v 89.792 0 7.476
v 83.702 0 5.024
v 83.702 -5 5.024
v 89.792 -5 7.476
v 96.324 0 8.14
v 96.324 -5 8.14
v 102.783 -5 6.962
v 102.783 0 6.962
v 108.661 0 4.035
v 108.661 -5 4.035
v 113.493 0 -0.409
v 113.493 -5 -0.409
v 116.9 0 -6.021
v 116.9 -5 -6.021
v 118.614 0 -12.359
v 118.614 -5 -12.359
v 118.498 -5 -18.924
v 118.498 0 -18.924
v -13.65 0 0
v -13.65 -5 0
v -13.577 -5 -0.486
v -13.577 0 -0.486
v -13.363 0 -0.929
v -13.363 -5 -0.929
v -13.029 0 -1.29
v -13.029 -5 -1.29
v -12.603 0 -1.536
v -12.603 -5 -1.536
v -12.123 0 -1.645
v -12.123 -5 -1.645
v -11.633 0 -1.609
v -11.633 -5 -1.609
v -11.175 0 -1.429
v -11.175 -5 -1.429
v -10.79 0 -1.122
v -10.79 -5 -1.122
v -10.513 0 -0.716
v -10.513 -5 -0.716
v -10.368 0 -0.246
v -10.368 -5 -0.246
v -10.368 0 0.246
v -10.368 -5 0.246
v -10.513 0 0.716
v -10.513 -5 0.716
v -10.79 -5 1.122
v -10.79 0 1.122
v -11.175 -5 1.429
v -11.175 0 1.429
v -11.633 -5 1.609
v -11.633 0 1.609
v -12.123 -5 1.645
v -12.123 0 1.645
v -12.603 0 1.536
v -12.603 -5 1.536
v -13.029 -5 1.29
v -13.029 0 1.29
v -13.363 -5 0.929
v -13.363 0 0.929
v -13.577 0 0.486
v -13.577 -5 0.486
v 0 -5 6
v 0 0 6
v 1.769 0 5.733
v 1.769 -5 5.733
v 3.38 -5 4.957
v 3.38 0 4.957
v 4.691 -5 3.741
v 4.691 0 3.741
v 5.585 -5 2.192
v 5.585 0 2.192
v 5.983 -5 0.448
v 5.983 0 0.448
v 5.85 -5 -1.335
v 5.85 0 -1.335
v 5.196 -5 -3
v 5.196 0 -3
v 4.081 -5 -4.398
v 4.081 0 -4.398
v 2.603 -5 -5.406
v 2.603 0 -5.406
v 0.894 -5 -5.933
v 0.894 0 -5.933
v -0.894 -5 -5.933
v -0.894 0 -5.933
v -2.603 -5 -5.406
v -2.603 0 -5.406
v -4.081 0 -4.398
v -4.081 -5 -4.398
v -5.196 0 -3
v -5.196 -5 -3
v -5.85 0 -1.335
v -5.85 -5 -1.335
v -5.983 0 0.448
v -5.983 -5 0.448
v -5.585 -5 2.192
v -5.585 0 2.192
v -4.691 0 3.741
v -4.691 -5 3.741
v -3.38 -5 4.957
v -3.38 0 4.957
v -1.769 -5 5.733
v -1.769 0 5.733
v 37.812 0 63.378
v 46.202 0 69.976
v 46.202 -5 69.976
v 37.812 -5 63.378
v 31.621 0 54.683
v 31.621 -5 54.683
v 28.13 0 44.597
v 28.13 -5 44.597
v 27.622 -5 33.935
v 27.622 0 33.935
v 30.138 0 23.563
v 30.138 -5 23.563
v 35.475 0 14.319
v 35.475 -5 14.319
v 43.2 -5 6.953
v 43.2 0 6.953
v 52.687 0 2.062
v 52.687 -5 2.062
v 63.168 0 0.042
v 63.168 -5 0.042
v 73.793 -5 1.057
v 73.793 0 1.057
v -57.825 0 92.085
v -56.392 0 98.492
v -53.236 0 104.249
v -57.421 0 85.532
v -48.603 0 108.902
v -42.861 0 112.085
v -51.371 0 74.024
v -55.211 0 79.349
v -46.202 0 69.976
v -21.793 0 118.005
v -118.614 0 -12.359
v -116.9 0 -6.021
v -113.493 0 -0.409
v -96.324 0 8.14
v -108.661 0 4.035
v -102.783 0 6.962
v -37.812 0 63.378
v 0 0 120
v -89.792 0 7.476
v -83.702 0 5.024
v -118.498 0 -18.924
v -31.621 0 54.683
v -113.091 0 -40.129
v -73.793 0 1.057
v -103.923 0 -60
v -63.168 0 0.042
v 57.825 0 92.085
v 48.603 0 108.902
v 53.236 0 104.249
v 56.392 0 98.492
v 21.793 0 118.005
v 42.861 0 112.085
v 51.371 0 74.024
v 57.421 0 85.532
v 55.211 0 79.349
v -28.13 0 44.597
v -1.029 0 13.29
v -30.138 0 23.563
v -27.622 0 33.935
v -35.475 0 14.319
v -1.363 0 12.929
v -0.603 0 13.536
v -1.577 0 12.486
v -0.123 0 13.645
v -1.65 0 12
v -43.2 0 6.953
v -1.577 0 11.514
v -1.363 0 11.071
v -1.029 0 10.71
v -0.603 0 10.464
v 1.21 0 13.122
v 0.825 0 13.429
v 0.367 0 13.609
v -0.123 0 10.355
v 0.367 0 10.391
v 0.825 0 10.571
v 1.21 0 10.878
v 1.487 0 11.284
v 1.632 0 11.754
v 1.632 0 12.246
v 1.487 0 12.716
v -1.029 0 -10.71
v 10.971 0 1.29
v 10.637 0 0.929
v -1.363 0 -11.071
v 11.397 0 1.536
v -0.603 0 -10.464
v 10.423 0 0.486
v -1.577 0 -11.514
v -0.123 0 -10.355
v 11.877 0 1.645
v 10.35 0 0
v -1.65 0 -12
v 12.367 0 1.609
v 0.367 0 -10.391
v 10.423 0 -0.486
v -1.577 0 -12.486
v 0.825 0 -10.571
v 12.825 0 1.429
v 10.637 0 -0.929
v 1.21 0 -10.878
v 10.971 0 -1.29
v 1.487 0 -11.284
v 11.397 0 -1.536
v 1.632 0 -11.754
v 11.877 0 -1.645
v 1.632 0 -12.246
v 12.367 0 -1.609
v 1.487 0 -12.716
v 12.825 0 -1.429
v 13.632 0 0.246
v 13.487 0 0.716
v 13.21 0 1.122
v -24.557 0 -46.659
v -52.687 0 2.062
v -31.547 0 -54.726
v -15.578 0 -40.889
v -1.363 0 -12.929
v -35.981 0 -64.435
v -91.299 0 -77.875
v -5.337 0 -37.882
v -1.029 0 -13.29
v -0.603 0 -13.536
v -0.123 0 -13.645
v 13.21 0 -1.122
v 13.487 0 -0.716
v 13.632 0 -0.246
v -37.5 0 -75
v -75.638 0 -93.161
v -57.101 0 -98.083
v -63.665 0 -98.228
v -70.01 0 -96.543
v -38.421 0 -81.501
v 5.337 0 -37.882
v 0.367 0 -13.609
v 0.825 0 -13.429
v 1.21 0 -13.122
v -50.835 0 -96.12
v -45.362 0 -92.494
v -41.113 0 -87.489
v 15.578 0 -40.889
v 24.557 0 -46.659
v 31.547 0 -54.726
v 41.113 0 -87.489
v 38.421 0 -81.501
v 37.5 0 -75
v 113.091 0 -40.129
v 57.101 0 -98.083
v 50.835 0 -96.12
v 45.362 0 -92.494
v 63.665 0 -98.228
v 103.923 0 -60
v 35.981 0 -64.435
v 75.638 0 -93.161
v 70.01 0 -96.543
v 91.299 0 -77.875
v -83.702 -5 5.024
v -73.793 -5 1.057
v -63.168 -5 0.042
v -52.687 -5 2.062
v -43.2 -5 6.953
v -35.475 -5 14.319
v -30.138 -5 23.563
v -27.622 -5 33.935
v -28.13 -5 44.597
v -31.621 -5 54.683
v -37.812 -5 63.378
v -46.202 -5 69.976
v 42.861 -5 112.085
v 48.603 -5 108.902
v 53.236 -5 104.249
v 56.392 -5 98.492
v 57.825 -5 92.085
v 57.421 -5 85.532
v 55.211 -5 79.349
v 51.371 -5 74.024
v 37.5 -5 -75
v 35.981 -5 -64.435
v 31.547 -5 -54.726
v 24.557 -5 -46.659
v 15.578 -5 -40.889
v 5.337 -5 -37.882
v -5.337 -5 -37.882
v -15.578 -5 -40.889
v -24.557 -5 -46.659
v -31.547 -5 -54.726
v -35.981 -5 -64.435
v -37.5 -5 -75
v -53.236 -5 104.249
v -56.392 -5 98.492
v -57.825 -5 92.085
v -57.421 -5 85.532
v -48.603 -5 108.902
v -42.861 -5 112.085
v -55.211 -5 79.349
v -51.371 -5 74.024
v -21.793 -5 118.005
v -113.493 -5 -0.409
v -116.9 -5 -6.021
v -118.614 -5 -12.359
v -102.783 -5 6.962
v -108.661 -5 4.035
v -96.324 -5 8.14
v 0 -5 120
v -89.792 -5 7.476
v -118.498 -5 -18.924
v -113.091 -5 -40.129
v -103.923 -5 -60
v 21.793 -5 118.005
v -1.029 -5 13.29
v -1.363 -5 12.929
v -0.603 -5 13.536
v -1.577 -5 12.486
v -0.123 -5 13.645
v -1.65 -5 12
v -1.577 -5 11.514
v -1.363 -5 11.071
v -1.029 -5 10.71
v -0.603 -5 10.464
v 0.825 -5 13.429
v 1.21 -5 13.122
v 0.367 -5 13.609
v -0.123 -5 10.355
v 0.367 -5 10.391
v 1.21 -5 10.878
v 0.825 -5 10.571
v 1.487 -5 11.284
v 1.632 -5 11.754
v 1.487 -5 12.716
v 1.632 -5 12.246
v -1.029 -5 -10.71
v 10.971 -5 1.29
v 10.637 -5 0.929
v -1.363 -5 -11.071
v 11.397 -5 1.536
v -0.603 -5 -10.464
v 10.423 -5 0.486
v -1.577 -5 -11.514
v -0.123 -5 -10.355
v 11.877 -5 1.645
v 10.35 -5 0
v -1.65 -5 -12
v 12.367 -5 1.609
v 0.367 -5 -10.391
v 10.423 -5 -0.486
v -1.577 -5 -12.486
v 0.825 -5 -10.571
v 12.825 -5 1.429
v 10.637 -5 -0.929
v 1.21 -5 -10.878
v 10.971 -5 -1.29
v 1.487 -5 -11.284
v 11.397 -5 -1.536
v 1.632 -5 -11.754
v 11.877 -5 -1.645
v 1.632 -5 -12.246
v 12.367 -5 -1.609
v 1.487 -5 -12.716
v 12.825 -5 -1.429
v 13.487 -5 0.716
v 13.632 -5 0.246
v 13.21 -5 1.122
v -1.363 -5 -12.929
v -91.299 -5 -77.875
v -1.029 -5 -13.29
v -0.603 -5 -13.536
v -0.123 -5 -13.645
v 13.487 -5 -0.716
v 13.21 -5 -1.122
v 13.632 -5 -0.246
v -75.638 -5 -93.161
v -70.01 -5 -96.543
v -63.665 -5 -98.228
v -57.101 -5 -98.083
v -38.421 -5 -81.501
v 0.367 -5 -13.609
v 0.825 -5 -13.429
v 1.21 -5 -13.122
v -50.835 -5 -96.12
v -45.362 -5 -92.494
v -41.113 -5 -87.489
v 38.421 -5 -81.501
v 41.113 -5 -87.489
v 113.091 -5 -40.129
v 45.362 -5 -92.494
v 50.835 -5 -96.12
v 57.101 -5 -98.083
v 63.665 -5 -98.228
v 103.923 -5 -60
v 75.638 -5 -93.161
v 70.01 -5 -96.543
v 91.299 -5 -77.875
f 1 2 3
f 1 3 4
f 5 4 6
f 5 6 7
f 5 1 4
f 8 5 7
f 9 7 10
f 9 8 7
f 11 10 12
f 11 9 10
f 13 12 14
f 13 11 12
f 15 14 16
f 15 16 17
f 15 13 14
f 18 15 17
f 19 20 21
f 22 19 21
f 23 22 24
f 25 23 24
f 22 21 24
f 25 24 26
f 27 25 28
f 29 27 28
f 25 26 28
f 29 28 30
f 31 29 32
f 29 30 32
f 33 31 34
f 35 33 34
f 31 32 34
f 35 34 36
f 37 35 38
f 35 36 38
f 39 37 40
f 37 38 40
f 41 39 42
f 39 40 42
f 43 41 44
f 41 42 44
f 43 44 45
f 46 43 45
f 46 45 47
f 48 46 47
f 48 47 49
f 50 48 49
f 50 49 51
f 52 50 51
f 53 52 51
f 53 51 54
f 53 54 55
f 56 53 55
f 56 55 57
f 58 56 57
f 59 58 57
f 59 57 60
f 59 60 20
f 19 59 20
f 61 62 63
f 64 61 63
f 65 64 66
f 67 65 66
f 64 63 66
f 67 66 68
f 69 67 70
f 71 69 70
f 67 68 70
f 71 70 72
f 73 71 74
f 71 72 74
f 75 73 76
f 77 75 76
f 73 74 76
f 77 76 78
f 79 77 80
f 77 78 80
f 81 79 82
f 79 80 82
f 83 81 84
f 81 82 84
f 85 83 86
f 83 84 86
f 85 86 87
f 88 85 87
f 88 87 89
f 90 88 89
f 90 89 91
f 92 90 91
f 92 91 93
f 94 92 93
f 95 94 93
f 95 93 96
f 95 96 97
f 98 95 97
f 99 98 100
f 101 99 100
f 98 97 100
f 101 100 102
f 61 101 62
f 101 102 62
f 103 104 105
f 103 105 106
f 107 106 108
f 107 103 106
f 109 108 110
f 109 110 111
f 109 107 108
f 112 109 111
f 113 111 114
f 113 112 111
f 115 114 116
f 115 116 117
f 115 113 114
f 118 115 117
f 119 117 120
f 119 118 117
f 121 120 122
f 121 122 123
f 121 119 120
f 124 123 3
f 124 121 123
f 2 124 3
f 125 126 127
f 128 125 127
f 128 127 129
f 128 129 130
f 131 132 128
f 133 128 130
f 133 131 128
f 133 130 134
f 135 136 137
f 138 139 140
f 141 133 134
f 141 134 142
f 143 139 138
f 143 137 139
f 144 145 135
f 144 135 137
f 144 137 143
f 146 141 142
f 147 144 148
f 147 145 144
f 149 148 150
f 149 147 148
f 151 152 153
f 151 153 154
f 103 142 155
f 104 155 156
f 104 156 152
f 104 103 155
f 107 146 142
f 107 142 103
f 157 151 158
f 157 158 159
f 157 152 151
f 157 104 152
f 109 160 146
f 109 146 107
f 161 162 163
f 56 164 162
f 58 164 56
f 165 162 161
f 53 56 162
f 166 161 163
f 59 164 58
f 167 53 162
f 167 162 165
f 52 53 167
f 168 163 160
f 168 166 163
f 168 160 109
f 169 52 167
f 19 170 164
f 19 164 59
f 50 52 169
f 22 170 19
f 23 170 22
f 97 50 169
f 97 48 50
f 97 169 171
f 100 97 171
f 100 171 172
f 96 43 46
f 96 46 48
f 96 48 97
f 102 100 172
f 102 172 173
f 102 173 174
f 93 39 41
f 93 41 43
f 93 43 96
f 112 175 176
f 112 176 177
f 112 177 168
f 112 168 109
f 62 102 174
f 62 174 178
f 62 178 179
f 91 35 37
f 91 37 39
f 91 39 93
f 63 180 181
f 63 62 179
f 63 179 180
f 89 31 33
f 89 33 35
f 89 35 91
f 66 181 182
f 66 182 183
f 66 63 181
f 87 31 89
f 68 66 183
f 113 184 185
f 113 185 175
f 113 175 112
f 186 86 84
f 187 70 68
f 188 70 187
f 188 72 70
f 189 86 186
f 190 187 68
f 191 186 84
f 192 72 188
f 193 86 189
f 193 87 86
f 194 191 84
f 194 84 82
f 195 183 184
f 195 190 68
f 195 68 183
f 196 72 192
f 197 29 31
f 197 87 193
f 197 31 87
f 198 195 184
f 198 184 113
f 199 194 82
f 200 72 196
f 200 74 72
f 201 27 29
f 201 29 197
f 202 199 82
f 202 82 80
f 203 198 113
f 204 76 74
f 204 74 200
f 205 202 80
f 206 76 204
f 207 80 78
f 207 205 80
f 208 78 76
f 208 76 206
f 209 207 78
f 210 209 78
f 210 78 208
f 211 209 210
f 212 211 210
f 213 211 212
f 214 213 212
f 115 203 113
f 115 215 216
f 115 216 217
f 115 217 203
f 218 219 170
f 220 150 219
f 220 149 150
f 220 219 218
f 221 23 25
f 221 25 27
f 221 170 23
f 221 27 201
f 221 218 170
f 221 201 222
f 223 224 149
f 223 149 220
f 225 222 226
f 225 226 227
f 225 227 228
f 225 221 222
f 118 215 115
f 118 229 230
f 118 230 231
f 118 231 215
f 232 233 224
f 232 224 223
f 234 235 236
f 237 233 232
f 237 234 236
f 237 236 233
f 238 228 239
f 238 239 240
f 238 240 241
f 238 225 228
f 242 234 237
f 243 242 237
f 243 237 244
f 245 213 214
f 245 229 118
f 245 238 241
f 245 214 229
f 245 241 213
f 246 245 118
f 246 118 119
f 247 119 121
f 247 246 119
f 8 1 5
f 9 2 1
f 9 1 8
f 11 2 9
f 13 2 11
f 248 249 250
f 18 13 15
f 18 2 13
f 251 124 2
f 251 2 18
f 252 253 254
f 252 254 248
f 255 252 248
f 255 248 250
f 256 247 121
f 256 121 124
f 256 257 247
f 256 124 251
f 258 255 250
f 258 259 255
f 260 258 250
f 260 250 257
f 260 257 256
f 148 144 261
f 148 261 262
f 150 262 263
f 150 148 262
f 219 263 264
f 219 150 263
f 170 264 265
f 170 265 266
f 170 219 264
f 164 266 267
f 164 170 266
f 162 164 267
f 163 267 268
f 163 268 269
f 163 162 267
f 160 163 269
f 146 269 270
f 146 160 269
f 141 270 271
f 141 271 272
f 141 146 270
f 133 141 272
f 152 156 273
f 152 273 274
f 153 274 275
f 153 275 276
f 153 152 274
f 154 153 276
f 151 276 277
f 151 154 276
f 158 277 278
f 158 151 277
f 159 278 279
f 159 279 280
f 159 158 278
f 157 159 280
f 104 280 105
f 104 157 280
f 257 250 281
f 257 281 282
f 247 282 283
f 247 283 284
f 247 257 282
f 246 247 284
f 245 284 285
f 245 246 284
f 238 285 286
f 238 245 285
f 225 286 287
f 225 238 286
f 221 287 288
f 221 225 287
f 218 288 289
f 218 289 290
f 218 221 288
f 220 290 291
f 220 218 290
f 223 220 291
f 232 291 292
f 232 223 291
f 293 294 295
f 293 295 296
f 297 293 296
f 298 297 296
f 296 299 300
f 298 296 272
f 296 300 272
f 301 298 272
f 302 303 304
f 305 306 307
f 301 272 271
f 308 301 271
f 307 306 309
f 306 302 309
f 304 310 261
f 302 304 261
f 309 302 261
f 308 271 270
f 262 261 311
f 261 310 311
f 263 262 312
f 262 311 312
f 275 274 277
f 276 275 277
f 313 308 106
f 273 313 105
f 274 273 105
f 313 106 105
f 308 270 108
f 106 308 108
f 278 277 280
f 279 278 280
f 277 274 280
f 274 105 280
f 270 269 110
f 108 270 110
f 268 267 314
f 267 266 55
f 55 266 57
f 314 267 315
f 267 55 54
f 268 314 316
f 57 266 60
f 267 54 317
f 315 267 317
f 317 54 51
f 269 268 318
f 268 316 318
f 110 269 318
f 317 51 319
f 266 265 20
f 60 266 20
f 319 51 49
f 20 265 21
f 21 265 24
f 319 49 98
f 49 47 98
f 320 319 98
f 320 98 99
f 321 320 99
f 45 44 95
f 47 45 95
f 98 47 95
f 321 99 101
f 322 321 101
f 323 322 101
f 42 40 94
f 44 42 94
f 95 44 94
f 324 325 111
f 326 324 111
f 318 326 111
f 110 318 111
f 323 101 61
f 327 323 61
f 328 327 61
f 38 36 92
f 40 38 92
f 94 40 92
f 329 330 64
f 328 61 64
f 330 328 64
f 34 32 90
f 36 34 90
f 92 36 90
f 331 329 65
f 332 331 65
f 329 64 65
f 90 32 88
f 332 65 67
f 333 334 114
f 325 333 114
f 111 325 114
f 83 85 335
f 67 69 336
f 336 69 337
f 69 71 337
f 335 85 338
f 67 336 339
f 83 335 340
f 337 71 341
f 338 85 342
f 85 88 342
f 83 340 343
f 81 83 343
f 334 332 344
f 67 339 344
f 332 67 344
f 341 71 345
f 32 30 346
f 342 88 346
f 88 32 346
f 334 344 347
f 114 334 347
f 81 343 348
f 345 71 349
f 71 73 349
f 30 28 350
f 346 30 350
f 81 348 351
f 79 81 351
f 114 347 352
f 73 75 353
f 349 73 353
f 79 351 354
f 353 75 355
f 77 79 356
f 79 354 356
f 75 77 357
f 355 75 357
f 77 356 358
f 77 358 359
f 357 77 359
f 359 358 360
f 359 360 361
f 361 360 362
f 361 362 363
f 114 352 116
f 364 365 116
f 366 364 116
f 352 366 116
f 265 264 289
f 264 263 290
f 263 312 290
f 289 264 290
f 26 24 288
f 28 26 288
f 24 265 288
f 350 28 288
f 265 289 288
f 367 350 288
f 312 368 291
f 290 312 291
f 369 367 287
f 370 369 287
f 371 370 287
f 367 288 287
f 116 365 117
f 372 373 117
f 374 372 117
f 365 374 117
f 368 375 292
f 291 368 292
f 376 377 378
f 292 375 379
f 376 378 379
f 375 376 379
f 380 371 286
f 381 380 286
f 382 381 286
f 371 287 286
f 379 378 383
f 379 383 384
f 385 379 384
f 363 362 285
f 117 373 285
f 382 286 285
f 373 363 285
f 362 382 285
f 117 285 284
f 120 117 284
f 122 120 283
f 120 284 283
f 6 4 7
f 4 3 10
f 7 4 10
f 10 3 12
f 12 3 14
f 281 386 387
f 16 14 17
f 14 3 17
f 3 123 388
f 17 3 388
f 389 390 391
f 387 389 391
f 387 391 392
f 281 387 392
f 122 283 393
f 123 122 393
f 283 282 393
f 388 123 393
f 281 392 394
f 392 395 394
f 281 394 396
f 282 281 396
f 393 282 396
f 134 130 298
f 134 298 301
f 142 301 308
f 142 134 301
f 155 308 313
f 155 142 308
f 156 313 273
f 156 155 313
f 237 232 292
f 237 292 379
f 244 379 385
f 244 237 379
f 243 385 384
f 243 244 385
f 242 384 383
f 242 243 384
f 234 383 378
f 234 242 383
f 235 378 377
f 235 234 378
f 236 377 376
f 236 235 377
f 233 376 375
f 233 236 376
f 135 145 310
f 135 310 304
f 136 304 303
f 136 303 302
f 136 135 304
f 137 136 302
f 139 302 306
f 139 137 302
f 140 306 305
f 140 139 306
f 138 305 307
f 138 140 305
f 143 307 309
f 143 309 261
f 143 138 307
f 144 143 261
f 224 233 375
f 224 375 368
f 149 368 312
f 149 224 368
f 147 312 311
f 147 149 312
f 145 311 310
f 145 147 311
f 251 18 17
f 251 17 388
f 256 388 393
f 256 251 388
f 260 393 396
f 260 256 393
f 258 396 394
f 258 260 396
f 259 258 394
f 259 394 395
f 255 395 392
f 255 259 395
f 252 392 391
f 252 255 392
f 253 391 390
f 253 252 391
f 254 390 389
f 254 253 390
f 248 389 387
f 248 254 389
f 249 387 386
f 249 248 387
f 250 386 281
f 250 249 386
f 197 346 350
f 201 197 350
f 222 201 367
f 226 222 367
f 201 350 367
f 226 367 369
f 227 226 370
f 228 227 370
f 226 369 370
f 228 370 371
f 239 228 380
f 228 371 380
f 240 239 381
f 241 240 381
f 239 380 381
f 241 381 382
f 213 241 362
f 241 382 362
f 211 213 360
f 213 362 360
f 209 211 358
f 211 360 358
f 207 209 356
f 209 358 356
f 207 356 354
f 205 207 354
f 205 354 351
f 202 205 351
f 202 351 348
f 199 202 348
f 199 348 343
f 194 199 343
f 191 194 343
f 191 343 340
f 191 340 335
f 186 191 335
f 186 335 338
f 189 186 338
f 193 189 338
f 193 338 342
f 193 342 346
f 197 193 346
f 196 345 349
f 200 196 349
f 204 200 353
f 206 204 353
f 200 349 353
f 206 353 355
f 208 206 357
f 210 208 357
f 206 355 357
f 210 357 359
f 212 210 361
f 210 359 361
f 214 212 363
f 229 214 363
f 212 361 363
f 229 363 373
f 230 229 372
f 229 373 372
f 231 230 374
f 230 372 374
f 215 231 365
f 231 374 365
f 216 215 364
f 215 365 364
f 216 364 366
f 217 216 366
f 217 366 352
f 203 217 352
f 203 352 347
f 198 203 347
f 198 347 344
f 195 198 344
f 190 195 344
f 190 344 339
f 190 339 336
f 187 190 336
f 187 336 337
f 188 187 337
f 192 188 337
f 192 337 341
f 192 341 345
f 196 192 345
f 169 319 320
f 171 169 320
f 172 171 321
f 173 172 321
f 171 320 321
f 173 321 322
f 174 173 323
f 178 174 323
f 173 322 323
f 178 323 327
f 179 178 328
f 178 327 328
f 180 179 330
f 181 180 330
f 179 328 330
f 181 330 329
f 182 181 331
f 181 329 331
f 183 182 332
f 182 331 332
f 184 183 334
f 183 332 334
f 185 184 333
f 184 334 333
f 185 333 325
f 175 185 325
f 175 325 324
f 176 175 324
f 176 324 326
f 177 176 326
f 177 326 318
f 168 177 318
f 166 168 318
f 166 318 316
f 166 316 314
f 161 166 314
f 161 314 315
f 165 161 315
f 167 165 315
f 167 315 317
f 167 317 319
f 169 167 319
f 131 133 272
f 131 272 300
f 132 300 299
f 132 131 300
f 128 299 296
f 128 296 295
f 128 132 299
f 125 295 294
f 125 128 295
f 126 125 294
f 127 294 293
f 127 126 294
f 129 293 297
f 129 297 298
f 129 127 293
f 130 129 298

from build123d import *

# Parameters (mm, degrees)
SKETCH_1_R         = 6
EXTRUDE_1_DEPTH    = 5
HOLE_WIZARD_M4_1_D = 3.3


with BuildPart() as part:
    # 草圖1 → 填料-伸長1 (new body)
    with BuildSketch(Plane(origin=(0, 0, 0), x_dir=(1, 0, 0), z_dir=(0, 1, 0))):
        with BuildLine():
            ThreePointArc((-75.637707948, 93.160813309), (-103.923048454, 60), (-118.498484937, 18.923769913))
            ThreePointArc((-118.498484937, 18.923769913), (-108.660524842, -4.035424469), (-83.701905284, -5.024047358))
            ThreePointArc((-83.701905284, -5.024047358), (-32.475952642, -18.75), (-46.201905284, -69.975952642))
            ThreePointArc((-46.201905284, -69.975952642), (-57.825042527, -92.085062668), (-42.860776988, -112.084583222))
            ThreePointArc((-42.860776988, -112.084583222), (0, -120), (42.860776988, -112.084583222))
            ThreePointArc((42.860776988, -112.084583222), (57.825042527, -92.085062668), (46.201905284, -69.975952642))
            ThreePointArc((46.201905284, -69.975952642), (32.475952642, -18.75), (83.701905284, -5.024047358))
            ThreePointArc((83.701905284, -5.024047358), (108.660524842, -4.035424469), (118.498484937, 18.923769913))
            ThreePointArc((118.498484937, 18.923769913), (103.923048454, 60), (75.637707948, 93.160813309))
            ThreePointArc((75.637707948, 93.160813309), (50.835482316, 96.120487137), (37.5, 75))
            ThreePointArc((37.5, 75), (0, 37.5), (-37.5, 75))
            ThreePointArc((-37.5, 75), (-50.835482316, 96.120487137), (-75.637707948, 93.160813309))
        make_face()
        with Locations(Location((0, 0, 0), (0, 0, 270))):
            Circle(SKETCH_1_R, mode=Mode.SUBTRACT)
    extrude(amount=-EXTRUDE_1_DEPTH)

    # M4 螺紋孔1 (through all)
    with Locations(Plane(origin=(0, 0, 0), x_dir=(1, 0, 0), z_dir=(0, 1, 0))):
        with Locations((0, 12), (12, 0), (0, -12), (-12, 0)):
            Hole(HOLE_WIZARD_M4_1_D / 2)


solid = part.part
